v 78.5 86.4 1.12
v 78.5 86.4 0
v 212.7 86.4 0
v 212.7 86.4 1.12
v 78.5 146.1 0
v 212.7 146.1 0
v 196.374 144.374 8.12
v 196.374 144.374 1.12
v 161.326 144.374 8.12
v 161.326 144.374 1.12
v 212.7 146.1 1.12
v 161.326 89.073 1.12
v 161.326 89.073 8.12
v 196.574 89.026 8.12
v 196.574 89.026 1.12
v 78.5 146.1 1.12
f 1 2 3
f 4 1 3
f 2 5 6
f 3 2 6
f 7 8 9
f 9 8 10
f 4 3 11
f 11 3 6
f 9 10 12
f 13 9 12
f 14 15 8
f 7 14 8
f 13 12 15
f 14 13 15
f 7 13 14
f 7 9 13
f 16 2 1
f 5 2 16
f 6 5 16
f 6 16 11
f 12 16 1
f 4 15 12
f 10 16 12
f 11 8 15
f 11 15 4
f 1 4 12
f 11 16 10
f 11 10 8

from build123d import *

# Parameters (mm, degrees)
SKETCH1_W           = 134.1999983
SKETCH1_H           = 59.69999998
BOSS_EXTRUDE1_DEPTH = 1.12
BOSS_EXTRUDE2_DEPTH = 7


with BuildPart() as part:
    # Sketch1 → Boss-Extrude1 (new body)
    with BuildSketch(Plane.XY):
        with Locations((145.59999963, 116.24999991)):
            Rectangle(SKETCH1_W, SKETCH1_H)
    extrude(amount=BOSS_EXTRUDE1_DEPTH)

    # Sketch2 → Boss-Extrude2 (add)
    with BuildSketch(Plane.XY.offset(1.12)):
        Polygon((161.3255092, 89.07300956), (196.57449128, 89.02550902), (196.37449168, 144.37449154), (161.3255092, 144.37449154), align=None)
    extrude(amount=BOSS_EXTRUDE2_DEPTH)


solid = part.part
